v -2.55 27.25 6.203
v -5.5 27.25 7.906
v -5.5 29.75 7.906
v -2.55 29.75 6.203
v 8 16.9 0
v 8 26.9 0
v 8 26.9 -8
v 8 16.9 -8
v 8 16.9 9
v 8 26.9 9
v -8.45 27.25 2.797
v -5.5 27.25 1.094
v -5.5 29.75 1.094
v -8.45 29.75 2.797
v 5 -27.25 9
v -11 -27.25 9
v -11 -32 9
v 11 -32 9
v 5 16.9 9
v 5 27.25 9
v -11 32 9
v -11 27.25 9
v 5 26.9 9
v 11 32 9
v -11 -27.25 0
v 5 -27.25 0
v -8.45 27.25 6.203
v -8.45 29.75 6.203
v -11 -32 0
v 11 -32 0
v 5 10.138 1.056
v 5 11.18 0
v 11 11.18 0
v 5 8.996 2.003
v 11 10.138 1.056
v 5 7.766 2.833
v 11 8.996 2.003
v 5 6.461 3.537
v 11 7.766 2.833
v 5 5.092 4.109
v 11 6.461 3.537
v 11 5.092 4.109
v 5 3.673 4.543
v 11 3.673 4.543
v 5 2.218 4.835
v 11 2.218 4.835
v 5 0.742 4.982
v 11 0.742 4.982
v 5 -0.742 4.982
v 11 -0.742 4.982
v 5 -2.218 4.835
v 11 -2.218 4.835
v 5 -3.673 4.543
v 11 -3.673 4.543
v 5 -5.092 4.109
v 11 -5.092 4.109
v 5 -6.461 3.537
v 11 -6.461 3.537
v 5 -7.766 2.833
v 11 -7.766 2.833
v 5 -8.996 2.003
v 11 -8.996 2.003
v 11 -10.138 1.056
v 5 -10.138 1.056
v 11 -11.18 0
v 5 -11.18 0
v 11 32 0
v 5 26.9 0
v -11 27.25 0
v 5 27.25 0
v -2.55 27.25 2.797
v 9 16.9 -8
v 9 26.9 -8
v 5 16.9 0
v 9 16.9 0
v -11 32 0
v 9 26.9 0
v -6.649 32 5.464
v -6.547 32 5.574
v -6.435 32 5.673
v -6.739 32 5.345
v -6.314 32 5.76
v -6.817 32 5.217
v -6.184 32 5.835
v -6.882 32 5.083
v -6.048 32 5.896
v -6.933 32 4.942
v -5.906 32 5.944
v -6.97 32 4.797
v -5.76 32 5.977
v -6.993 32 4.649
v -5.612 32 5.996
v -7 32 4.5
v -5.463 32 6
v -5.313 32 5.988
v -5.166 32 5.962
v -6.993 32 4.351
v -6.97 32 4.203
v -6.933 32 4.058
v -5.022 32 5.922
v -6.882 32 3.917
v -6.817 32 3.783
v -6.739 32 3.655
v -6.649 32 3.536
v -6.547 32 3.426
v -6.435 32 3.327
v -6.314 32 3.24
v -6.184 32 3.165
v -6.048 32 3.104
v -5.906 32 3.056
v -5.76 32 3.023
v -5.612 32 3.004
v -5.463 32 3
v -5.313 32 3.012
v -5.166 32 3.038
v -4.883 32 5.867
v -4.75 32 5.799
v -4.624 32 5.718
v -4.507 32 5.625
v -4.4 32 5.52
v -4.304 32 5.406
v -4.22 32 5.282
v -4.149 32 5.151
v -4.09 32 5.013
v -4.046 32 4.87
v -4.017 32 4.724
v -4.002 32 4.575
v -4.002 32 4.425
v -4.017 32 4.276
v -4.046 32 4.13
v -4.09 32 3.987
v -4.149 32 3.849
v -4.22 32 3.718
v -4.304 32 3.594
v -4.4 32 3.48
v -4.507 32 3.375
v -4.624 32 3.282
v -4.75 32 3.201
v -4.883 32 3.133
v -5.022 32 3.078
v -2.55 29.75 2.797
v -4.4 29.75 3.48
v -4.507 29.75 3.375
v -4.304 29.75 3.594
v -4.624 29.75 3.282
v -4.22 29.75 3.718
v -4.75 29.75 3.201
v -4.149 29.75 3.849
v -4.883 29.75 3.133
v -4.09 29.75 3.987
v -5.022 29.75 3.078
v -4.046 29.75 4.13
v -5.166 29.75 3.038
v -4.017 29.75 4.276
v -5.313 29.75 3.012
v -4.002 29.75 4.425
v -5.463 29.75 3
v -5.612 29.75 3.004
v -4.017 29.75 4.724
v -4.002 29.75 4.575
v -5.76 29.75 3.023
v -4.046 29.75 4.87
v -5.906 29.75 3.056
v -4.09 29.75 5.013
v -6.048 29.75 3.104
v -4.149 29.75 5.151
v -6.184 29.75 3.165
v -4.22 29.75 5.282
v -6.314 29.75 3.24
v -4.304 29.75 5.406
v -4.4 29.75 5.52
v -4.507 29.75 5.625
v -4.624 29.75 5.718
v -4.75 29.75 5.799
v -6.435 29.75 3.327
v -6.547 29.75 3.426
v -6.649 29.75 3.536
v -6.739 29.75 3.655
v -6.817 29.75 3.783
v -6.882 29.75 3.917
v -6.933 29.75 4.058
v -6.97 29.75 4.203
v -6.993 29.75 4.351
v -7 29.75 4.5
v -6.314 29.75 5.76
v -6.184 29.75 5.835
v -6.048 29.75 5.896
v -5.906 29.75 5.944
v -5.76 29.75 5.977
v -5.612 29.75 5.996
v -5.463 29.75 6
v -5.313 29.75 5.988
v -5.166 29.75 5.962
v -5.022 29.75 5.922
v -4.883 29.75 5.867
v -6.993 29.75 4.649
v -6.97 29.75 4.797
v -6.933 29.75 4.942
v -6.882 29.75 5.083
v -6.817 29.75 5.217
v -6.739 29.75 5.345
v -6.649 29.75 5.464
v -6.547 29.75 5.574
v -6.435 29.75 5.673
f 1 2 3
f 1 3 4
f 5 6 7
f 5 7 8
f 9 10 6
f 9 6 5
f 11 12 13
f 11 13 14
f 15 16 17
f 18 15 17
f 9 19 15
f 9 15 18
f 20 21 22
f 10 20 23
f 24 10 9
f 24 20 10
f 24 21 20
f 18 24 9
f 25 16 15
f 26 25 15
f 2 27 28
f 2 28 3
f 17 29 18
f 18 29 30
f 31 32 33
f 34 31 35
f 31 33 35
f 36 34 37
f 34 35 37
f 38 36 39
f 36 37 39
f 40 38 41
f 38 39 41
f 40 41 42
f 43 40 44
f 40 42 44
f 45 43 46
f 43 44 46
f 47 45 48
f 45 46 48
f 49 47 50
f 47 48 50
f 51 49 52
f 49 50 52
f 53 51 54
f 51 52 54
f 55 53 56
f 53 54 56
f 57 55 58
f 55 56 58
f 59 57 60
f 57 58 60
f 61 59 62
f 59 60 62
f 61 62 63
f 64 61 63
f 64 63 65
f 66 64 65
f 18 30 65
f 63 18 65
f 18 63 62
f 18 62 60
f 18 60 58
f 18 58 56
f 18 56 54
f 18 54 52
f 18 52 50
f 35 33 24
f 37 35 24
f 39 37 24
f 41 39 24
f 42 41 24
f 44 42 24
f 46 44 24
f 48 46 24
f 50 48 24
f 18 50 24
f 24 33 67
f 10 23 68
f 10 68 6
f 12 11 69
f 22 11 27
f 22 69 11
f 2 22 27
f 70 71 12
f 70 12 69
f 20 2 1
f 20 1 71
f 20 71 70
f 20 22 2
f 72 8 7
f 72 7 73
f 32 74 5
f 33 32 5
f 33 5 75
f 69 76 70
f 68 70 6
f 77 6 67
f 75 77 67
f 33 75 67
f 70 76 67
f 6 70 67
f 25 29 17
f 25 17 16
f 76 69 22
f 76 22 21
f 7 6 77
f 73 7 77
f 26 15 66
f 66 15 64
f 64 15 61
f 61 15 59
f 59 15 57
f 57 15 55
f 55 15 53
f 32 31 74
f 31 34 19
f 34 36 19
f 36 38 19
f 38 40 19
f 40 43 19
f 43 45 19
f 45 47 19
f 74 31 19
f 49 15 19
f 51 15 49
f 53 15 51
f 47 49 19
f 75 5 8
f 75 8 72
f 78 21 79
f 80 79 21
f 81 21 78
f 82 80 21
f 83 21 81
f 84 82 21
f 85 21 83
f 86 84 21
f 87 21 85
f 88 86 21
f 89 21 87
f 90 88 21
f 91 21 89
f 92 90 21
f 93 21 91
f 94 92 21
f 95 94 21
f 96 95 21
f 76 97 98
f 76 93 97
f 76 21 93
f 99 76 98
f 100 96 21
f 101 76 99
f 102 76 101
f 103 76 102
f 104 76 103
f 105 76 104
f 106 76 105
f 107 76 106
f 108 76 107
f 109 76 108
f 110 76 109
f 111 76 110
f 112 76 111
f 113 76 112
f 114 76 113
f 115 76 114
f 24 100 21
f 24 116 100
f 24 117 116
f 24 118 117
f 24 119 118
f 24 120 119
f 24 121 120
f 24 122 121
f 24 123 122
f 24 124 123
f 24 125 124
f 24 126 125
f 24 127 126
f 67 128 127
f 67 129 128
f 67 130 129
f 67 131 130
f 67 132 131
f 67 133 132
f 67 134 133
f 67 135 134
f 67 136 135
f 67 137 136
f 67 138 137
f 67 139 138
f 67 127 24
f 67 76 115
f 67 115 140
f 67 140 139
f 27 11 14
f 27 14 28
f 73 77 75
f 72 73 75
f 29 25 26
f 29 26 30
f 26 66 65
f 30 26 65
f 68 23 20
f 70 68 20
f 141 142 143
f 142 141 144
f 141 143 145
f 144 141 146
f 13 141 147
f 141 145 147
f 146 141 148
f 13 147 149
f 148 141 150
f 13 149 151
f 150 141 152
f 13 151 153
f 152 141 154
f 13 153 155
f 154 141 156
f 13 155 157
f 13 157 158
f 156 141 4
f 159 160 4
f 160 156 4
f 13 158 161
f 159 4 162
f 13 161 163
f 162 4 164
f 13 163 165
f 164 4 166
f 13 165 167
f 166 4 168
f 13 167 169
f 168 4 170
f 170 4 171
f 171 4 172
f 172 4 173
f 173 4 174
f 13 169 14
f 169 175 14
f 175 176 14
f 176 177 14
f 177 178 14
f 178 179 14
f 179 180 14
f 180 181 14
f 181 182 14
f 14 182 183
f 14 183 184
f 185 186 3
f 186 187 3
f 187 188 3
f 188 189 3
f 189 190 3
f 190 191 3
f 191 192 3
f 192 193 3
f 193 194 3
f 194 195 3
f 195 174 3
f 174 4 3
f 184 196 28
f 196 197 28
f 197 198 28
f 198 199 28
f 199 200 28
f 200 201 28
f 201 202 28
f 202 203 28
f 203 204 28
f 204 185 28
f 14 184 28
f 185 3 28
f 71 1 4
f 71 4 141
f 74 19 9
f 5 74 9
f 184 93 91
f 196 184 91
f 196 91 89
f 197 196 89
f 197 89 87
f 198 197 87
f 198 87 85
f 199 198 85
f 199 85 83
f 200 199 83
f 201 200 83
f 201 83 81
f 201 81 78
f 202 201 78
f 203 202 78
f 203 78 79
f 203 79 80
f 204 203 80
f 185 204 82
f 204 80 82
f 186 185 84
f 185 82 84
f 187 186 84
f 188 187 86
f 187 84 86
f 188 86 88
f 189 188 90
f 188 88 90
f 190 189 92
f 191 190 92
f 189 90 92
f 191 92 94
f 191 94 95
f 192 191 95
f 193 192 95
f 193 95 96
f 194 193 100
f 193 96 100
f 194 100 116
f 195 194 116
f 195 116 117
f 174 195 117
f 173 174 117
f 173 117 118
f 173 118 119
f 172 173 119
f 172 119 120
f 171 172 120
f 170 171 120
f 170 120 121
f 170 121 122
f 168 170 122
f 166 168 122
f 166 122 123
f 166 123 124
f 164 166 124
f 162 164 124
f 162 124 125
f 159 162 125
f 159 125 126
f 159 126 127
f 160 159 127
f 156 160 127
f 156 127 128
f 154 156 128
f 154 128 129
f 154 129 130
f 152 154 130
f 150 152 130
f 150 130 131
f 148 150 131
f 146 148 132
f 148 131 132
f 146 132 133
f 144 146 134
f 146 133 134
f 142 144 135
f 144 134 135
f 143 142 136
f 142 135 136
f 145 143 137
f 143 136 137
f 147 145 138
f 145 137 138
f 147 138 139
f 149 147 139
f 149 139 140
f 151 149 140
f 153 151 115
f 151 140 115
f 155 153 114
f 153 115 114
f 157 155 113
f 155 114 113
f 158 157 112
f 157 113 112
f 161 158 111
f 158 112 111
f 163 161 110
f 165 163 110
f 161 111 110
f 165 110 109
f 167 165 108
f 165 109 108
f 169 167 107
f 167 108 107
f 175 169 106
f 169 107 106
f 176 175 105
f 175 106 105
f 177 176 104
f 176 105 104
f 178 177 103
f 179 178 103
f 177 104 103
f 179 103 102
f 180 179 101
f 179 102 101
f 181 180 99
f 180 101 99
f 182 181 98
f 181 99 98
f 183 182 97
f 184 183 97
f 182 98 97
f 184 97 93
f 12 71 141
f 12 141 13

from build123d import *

# Parameters (mm, degrees)
SKETCH_W        = 22
SKETCH_H        = 64
PAD_DEPTH       = 9
SKETCH001_W     = 16
SKETCH001_H     = 54.5
POCKET_DEPTH    = 9.001
SKETCH004_W     = 3
SKETCH004_H     = 10
POCKET001_DEPTH = 9.001
SKETCH003_R     = 15
POCKET002_DEPTH = 22.001
SKETCH006_R     = 1.5
POCKET003_DEPTH = 4.75
POCKET004_DEPTH = 2.5
SKETCH007_W     = 1
SKETCH007_H     = 10
PAD001_DEPTH    = 8


with BuildPart() as part:
    # Sketch → Pad (new body)
    with BuildSketch(Plane.XY):
        Rectangle(SKETCH_W, SKETCH_H)
    extrude(amount=PAD_DEPTH)

    # Sketch001 → Pocket (cut, through all)
    with BuildSketch(Plane.XY.offset(9)):
        with Locations((-3, 0)):
            Rectangle(SKETCH001_W, SKETCH001_H)
    extrude(amount=-POCKET_DEPTH, mode=Mode.SUBTRACT)

    # Sketch004 → Pocket001 (cut, through all)
    with BuildSketch(Plane.XY.offset(9)):
        with Locations((6.5, 21.9)):
            Rectangle(SKETCH004_W, SKETCH004_H)
    extrude(amount=-POCKET001_DEPTH, mode=Mode.SUBTRACT)

    # Sketch003 → Pocket002 (cut, through all)
    with BuildSketch(Plane.YZ.offset(11)):
        with Locations((0, -10)):
            Circle(SKETCH003_R)
    extrude(amount=-POCKET002_DEPTH, mode=Mode.SUBTRACT)

    # Sketch006 → Pocket003 (cut)
    with BuildSketch(Plane(origin=(0, 32, 0), x_dir=(-1, 0, 0), z_dir=(0, 1, 0))):
        with Locations((5.5, 4.5)):
            Circle(SKETCH006_R)
    extrude(amount=-POCKET003_DEPTH, mode=Mode.SUBTRACT)

    # Sketch008 → Pocket004 (cut)
    with BuildSketch(Plane.XZ.offset(-27.25)):
        Polygon((-8.45, 6.203183), (-5.5, 7.906367), (-2.55, 6.203183), (-2.55, 2.796817), (-5.5, 1.093633), (-8.45, 2.796817), align=None)
    extrude(amount=-POCKET004_DEPTH, mode=Mode.SUBTRACT)

    # Sketch007 → Pad001 (new body)
    with BuildSketch(Plane(origin=(0, 0, 0), x_dir=(1, 0, 0), z_dir=(0, 0, -1))):
        with Locations((8.5, -21.9)):
            Rectangle(SKETCH007_W, SKETCH007_H)
    extrude(amount=PAD001_DEPTH)


solid = part.part
